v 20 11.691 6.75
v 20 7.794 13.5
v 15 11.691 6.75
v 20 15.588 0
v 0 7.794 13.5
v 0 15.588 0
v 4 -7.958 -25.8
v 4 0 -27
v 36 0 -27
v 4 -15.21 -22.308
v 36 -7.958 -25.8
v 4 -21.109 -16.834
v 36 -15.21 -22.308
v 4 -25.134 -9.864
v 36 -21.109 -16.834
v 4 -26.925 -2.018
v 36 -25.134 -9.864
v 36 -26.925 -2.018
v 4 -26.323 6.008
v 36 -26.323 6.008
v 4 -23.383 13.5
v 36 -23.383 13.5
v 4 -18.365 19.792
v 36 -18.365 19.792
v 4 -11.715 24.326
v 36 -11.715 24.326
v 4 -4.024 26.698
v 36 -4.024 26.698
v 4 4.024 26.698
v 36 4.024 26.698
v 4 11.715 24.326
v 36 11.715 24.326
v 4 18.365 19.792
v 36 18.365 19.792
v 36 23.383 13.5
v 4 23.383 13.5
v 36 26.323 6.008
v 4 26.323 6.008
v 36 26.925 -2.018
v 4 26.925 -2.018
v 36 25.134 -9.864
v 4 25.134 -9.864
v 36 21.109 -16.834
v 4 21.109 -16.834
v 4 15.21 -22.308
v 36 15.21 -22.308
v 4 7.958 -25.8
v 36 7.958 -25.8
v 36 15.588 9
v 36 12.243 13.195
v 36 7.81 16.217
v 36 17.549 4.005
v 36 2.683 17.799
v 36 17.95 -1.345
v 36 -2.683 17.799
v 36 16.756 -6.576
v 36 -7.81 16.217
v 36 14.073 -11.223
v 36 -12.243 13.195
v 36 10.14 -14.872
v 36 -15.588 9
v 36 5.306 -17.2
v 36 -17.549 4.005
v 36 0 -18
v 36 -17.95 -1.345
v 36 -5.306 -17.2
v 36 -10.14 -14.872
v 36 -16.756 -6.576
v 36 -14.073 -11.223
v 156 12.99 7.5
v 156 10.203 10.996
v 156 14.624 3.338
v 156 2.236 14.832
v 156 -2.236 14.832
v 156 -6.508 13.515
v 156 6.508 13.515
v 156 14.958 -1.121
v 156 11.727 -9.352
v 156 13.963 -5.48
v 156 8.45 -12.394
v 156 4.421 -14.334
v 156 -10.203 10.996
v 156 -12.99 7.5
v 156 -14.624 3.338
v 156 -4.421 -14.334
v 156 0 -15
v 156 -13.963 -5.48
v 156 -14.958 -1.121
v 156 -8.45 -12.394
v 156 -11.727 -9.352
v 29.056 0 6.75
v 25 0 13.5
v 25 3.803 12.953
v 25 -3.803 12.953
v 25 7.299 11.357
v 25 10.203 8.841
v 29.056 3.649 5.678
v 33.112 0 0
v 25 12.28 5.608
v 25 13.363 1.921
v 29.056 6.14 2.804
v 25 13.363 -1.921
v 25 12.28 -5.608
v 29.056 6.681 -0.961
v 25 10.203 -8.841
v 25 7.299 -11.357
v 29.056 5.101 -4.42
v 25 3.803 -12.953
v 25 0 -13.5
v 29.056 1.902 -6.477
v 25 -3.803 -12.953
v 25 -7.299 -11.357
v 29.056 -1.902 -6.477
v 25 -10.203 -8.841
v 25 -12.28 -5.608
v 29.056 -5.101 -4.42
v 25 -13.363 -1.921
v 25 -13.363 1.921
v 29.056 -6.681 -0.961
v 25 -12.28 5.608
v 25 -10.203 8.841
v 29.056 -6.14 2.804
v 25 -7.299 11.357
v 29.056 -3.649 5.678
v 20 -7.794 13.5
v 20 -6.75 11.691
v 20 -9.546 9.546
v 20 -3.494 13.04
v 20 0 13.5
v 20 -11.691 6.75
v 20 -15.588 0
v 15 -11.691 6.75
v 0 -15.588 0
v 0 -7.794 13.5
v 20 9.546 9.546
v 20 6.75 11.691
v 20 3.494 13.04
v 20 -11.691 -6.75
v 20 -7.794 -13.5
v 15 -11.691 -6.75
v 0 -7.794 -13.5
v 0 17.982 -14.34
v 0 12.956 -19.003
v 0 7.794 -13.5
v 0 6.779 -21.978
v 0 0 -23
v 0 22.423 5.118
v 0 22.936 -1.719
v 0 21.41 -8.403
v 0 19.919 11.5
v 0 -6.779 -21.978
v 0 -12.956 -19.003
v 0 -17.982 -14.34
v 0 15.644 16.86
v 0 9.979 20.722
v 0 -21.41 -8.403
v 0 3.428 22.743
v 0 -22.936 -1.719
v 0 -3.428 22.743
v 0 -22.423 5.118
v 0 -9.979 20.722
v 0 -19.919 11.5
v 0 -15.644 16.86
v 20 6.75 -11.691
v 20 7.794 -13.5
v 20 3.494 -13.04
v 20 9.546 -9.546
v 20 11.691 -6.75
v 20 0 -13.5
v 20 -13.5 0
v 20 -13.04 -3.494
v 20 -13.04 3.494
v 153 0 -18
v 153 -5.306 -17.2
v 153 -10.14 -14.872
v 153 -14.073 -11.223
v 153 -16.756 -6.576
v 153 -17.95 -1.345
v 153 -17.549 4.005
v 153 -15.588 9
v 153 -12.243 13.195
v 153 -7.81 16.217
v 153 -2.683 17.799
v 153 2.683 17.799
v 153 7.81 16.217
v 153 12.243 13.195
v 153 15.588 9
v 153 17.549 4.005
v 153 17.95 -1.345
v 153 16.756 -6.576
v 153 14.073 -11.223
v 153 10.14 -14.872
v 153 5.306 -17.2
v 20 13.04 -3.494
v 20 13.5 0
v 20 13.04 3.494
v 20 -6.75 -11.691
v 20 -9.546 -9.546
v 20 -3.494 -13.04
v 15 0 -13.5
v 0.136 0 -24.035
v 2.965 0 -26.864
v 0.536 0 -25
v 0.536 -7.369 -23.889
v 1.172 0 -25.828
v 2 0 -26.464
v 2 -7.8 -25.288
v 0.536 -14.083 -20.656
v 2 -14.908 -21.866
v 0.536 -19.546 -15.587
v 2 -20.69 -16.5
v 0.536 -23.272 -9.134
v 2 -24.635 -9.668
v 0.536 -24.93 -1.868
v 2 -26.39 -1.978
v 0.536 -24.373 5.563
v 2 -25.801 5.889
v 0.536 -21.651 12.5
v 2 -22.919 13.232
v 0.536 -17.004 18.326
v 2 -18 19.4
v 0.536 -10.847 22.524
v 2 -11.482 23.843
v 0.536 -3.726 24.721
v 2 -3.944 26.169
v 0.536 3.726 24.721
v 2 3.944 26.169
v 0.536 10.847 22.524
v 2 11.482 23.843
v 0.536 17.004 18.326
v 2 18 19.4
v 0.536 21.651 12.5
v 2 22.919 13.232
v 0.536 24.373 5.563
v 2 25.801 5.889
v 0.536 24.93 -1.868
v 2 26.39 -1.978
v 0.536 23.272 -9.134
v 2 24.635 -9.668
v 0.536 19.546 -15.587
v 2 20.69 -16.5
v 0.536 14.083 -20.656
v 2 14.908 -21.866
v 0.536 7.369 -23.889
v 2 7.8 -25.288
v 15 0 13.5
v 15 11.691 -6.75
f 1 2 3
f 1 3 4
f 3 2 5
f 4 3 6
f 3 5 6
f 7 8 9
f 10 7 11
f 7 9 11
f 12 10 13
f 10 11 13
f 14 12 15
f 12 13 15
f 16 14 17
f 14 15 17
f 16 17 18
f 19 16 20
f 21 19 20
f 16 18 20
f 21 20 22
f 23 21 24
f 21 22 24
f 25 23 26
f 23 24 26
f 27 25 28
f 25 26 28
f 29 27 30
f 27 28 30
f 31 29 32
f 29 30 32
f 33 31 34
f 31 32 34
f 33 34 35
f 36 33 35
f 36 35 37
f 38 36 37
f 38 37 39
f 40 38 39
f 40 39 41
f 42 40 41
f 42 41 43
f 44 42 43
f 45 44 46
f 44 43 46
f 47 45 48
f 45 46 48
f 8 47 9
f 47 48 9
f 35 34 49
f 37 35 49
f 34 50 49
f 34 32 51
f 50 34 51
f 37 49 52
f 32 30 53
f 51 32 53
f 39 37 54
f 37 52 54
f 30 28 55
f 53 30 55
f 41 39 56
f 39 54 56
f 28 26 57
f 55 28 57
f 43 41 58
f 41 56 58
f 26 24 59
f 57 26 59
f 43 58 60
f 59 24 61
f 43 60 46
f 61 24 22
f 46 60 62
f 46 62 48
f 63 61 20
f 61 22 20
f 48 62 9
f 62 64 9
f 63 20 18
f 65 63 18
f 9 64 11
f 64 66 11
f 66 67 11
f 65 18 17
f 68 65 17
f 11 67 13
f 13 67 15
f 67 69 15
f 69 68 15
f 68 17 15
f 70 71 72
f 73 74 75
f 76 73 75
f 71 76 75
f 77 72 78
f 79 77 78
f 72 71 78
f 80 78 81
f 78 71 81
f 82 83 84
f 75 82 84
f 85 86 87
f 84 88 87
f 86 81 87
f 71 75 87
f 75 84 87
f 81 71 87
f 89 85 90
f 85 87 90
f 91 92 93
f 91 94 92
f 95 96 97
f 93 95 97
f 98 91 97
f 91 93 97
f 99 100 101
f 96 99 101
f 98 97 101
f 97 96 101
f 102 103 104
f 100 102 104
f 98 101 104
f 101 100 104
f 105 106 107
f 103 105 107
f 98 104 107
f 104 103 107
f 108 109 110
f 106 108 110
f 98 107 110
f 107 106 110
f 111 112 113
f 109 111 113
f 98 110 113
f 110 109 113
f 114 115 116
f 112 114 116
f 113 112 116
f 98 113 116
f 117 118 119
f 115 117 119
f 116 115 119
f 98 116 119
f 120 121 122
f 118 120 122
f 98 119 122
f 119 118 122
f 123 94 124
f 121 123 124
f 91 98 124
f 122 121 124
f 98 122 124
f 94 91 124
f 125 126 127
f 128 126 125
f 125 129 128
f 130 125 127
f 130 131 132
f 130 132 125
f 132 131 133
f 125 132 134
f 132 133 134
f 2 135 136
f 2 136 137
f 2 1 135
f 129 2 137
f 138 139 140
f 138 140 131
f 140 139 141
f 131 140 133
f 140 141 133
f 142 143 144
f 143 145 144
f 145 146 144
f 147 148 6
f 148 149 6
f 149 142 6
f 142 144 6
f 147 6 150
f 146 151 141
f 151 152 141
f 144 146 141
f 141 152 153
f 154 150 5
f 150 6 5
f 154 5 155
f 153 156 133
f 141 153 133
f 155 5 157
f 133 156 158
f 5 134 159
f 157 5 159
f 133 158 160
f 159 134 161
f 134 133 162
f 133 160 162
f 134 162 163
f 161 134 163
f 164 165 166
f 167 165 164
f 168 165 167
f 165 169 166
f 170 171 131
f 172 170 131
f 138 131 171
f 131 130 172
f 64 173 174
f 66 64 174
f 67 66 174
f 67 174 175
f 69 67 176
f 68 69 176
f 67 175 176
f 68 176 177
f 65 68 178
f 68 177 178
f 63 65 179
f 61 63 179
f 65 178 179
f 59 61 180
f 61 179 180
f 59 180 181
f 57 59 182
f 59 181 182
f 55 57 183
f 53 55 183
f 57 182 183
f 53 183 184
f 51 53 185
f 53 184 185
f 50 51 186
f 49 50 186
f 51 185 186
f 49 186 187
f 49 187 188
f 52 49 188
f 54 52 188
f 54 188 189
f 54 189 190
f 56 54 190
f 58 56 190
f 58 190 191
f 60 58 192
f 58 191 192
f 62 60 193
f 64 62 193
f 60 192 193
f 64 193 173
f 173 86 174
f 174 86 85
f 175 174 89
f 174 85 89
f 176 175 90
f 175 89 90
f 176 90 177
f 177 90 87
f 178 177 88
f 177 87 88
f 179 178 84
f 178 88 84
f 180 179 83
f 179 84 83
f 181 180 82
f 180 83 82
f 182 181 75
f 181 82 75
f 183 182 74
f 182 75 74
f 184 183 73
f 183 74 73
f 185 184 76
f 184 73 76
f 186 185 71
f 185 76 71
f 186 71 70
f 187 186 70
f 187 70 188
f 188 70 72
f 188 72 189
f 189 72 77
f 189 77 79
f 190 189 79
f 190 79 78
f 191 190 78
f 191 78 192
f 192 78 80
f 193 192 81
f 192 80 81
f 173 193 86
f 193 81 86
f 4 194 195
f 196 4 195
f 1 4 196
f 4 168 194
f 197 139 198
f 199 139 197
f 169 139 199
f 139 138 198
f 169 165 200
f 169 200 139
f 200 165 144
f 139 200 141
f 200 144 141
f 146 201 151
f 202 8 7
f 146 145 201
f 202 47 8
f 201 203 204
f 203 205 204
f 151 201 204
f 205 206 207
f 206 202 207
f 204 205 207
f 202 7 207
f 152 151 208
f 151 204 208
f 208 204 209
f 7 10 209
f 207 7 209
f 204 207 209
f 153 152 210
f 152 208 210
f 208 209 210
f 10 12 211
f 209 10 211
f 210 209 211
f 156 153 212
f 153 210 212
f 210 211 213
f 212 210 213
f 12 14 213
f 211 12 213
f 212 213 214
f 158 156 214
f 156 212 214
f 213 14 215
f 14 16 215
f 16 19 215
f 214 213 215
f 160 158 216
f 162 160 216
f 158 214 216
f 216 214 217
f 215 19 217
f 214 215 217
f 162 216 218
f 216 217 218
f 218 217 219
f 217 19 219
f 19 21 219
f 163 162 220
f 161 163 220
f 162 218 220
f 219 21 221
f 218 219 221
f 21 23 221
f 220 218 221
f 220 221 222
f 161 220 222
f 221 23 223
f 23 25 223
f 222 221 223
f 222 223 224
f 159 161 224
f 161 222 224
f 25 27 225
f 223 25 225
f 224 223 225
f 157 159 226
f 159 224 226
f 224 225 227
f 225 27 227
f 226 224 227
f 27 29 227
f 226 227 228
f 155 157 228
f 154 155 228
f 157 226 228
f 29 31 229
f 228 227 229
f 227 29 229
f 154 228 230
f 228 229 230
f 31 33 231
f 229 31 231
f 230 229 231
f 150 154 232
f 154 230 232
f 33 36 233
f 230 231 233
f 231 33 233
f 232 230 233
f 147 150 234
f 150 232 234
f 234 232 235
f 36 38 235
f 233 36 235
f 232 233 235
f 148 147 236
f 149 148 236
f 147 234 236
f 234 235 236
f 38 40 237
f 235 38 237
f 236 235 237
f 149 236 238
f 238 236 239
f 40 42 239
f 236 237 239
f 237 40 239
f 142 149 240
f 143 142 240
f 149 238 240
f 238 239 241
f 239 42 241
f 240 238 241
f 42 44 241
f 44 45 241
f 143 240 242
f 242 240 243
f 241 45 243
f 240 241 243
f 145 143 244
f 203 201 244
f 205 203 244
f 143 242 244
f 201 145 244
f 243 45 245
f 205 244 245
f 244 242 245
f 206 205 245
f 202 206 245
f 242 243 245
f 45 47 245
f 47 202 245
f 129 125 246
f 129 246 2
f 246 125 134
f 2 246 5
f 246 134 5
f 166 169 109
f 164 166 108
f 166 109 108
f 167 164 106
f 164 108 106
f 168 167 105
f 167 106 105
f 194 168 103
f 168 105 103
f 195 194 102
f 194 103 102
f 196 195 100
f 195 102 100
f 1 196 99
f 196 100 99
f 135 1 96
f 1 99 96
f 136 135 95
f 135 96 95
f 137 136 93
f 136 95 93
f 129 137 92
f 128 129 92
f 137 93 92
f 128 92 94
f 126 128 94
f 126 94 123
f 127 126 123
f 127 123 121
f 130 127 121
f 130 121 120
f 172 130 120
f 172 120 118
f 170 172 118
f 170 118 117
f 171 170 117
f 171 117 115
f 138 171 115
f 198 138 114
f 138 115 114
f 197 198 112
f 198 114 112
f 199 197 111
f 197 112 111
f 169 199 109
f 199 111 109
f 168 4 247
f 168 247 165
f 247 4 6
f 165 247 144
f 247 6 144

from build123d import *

# Parameters (mm, degrees)
CORTE_EXTRUS_O1_DEPTH            = 20
FURO_DE_DI_METRO_27_0_27_1_D     = 27
FURO_DE_DI_METRO_27_0_27_1_DEPTH = 5
FURO_DE_DI_METRO_27_0_27_1_TIP   = 8.111618357
FILETE1_R                        = 4
CHANFRO1_SIZE                    = 3


with BuildPart() as part:
    # Esboço1 → Revolução1 (revolve)
    with BuildSketch(Plane.XY, mode=Mode.PRIVATE) as revolu_o1_sk:
        Polygon((0, 0), (0, 27), (36, 27), (36, 18), (156, 18), (156, 0), align=None)
    revolve(revolu_o1_sk.sketch.rotate(Axis((156, 0, 0), (-1, 0, 0)), 90), axis=Axis((156, 0, 0), (-1, 0, 0)))

    # Esboço2 → Corte-extrusão1 (cut)
    with BuildSketch(Plane.ZY):
        Polygon((0, 15.588457268), (-13.5, 7.794228634), (-13.5, -7.794228634), (0, -15.588457268), (13.5, -7.794228634), (13.5, 7.794228634), align=None)
    extrude(amount=-CORTE_EXTRUS_O1_DEPTH, mode=Mode.SUBTRACT)

    # Furo de diâmetro Ø27.0 (27)1
    with Locations(Plane.ZY.offset(-20)):
        with Locations((0, 0)):
            Hole(FURO_DE_DI_METRO_27_0_27_1_D / 2, depth=FURO_DE_DI_METRO_27_0_27_1_DEPTH)
            with Locations((0, 0, -(FURO_DE_DI_METRO_27_0_27_1_DEPTH + FURO_DE_DI_METRO_27_0_27_1_TIP / 2))):  # 118° drill point
                Cone(0, FURO_DE_DI_METRO_27_0_27_1_D / 2, FURO_DE_DI_METRO_27_0_27_1_TIP, mode=Mode.SUBTRACT)

    # Filete1
    filete1_edges = [part.edges().sort_by_distance(p)[0] for p in [
        (0, 0, 27),
    ]]
    fillet(filete1_edges, radius=FILETE1_R)

    # Chanfro1
    chanfro1_edges = [part.edges().sort_by_distance(p)[0] for p in [
        (156, 0, 18),
    ]]
    chamfer(chanfro1_edges, length=CHANFRO1_SIZE)


solid = part.part
